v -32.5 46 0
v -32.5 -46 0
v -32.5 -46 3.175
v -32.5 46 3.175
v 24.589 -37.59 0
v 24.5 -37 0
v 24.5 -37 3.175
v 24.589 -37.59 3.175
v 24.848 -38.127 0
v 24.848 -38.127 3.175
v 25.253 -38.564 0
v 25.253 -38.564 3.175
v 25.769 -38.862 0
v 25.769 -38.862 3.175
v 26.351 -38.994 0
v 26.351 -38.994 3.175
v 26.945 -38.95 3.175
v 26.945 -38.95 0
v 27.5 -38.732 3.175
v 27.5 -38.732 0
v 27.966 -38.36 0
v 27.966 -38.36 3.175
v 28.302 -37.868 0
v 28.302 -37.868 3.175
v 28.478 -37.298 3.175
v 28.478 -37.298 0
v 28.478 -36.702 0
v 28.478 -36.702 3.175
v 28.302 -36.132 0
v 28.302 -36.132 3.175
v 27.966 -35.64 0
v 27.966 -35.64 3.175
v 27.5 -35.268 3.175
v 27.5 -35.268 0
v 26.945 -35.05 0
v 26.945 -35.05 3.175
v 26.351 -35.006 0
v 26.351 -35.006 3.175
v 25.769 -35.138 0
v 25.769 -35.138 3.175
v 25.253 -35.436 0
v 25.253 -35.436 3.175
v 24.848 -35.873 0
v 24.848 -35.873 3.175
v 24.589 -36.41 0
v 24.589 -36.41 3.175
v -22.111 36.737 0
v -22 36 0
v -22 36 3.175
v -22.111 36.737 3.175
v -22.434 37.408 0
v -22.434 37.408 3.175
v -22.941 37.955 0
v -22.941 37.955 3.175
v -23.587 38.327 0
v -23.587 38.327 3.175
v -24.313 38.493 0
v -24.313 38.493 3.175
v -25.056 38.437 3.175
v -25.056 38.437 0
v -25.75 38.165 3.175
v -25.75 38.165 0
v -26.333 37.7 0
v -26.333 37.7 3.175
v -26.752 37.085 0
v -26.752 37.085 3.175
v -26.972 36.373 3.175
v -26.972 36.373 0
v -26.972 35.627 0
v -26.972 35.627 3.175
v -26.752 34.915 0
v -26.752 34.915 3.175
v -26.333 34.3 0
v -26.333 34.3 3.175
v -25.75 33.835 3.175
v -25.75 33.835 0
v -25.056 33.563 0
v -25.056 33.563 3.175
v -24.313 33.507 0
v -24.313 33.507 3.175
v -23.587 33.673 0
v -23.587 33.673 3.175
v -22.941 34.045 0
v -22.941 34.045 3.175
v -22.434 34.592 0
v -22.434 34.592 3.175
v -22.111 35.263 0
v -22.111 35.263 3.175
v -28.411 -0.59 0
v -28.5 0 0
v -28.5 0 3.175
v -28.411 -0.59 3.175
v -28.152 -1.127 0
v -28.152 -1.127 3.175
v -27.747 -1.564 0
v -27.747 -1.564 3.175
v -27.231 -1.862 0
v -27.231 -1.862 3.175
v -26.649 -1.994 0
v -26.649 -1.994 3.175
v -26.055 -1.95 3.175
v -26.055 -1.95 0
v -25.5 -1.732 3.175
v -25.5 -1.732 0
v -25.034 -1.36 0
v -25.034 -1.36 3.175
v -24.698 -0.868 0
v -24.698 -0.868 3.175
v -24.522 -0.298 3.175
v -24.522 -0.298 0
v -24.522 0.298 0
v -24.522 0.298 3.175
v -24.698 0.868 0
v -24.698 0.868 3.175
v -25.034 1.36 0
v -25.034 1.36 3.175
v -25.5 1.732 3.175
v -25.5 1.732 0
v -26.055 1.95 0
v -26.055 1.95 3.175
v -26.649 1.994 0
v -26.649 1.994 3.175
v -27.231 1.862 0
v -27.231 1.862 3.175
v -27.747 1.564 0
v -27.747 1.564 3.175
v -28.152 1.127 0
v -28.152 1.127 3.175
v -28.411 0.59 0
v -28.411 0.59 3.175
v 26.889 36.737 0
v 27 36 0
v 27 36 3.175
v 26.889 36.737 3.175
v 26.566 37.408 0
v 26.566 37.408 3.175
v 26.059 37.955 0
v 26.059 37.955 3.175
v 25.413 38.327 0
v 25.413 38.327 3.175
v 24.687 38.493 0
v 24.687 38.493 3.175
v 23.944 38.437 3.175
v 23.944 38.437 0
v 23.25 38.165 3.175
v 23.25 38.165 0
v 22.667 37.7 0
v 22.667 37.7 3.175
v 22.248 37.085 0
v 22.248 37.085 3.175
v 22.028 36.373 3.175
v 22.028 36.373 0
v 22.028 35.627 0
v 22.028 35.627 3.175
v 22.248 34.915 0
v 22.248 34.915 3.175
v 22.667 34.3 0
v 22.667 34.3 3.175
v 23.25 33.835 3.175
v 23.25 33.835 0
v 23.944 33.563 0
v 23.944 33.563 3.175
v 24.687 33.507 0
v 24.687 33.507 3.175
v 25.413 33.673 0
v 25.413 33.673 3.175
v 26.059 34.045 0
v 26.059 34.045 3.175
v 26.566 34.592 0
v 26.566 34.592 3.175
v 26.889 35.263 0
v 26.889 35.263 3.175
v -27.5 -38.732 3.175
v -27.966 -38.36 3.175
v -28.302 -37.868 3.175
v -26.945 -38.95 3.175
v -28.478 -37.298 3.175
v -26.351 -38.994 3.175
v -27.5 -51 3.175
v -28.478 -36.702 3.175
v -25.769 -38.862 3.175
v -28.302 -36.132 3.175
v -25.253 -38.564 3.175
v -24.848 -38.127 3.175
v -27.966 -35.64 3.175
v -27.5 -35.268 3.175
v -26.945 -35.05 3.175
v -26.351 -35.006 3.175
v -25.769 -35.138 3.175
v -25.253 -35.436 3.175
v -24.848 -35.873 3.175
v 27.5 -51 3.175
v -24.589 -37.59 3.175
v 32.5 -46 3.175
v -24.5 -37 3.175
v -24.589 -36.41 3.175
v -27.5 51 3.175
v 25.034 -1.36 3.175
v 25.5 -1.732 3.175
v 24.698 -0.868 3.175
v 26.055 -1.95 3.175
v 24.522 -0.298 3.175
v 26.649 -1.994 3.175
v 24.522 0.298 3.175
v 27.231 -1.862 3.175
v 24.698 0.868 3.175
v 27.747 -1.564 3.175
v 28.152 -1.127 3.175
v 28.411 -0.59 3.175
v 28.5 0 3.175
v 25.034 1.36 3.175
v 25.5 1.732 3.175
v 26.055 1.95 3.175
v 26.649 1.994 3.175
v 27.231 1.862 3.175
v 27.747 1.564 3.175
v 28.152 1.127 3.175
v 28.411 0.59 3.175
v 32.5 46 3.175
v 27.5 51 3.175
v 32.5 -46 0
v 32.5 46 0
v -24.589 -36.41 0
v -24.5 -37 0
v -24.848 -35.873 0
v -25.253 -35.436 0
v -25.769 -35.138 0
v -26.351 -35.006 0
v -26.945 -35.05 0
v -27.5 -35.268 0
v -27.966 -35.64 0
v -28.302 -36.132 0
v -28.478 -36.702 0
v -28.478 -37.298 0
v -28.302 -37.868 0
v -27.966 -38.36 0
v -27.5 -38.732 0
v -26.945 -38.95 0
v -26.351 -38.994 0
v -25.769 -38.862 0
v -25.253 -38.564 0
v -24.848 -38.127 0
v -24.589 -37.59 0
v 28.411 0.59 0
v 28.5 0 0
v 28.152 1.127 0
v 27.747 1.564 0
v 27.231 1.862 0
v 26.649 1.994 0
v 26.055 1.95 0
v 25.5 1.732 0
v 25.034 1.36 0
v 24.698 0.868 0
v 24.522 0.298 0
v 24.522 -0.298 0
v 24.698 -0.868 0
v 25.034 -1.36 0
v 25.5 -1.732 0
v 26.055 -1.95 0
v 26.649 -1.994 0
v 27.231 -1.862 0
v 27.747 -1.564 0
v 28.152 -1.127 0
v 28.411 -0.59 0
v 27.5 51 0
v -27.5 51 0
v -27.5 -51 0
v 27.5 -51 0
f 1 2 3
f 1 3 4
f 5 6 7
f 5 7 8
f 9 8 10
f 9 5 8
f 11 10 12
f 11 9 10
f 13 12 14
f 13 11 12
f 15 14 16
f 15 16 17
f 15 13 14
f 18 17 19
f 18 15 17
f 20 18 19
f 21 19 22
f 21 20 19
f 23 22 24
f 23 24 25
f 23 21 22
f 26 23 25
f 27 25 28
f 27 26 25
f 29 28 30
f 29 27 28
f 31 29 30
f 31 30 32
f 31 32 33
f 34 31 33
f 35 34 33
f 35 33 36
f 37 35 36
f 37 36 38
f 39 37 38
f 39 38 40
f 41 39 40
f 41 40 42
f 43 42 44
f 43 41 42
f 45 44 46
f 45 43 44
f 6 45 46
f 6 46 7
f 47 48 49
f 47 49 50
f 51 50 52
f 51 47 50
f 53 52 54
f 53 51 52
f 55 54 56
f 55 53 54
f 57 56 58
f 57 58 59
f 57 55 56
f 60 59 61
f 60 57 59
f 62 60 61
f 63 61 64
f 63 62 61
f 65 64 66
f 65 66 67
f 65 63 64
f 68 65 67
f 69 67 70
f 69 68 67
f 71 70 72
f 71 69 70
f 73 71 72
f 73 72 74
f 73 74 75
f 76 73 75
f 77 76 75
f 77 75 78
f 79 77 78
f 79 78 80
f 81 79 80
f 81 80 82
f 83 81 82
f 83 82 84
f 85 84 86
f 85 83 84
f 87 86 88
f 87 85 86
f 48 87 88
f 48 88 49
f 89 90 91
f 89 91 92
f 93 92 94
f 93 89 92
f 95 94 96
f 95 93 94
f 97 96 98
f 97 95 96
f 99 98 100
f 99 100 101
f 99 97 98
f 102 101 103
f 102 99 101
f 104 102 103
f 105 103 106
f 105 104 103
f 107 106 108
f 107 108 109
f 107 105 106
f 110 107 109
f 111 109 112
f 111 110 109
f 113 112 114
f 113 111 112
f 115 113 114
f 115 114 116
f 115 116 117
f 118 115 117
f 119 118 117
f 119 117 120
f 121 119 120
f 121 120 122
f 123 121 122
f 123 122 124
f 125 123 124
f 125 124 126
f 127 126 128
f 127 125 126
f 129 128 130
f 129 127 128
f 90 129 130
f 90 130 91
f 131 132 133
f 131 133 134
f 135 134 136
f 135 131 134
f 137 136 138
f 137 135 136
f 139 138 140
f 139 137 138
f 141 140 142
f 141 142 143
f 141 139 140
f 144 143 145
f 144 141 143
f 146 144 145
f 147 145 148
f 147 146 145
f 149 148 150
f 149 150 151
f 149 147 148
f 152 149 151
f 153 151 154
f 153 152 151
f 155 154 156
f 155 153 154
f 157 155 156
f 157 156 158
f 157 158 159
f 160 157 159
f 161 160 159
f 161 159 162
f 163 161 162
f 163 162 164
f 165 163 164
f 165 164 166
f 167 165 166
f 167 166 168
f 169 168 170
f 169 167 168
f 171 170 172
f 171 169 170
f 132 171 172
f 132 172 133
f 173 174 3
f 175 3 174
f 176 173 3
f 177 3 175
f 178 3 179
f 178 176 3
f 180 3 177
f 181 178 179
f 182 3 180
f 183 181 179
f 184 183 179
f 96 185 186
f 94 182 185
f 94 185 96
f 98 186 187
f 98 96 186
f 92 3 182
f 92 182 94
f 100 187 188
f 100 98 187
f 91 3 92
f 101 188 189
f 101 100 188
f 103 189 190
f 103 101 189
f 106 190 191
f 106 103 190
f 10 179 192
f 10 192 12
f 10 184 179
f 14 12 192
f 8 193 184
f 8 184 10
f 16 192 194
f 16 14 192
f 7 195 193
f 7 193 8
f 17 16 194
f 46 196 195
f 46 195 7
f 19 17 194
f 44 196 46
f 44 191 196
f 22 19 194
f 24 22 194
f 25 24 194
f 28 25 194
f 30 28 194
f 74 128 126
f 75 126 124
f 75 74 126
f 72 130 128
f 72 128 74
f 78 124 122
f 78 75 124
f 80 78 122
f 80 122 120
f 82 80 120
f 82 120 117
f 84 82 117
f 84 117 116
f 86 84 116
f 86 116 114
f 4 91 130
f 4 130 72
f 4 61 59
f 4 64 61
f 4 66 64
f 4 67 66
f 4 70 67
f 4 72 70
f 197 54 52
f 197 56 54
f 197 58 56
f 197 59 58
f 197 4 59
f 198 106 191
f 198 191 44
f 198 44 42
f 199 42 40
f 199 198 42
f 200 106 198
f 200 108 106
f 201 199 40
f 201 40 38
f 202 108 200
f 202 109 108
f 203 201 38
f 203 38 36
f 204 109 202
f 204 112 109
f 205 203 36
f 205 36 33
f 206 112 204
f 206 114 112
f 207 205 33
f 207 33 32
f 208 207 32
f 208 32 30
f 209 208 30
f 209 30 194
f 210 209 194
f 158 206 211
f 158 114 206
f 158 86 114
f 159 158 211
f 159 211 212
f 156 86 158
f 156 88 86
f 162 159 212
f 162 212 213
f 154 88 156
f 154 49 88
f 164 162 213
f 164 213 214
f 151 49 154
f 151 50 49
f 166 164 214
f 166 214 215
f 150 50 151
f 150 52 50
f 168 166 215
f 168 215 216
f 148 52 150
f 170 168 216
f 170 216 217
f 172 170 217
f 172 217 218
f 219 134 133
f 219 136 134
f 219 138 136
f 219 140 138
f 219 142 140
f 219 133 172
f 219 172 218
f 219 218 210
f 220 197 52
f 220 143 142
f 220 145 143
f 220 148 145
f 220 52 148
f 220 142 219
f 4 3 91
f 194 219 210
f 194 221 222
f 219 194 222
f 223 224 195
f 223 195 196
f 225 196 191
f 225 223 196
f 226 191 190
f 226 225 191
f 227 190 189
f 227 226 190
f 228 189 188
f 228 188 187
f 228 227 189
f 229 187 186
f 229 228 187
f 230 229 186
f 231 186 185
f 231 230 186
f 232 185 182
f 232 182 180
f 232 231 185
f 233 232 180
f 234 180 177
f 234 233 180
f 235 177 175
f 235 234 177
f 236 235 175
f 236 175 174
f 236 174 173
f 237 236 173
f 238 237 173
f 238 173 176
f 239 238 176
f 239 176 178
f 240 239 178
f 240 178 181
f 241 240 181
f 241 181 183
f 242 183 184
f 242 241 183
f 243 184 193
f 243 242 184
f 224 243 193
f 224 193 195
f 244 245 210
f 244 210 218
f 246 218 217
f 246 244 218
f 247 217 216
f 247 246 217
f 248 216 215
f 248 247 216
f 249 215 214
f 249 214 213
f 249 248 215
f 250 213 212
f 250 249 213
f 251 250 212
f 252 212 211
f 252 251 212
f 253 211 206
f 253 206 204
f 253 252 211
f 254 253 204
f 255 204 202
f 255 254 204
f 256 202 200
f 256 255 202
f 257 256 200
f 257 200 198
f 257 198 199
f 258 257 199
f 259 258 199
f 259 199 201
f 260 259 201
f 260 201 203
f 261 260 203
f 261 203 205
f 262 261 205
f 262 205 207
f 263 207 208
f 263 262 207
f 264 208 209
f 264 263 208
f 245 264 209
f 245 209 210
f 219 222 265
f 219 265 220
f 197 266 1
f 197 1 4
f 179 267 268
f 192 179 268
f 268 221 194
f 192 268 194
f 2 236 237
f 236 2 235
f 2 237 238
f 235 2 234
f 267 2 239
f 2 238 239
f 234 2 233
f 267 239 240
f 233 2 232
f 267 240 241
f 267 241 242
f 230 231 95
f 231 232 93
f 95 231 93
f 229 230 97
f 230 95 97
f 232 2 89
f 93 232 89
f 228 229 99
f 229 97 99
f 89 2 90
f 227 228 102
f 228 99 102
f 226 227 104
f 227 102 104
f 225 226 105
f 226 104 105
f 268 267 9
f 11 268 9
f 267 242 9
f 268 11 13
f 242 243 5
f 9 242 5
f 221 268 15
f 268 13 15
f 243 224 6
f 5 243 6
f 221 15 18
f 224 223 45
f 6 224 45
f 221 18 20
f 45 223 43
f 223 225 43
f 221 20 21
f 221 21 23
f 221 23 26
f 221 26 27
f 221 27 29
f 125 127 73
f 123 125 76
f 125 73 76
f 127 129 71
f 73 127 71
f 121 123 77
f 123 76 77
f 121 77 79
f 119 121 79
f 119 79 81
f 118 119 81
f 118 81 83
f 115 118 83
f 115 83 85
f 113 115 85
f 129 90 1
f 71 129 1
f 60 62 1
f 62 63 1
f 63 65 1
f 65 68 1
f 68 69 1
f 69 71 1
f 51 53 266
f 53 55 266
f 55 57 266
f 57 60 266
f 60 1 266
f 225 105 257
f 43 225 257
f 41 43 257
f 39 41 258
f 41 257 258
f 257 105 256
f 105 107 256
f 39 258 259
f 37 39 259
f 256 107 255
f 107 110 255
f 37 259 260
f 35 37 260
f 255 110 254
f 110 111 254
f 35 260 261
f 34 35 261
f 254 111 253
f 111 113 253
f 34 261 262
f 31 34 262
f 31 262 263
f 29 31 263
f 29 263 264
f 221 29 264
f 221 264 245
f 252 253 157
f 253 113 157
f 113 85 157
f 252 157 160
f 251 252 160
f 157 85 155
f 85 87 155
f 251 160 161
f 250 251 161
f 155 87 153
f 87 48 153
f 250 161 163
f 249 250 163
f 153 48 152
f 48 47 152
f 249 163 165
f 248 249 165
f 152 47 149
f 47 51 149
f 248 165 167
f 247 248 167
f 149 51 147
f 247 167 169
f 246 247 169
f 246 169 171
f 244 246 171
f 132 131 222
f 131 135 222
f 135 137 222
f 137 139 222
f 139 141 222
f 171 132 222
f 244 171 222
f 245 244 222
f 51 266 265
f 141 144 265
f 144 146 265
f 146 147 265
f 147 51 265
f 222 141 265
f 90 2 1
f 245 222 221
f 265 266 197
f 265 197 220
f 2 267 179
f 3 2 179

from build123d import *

# Parameters (mm, degrees)
SKETCH1_W           = 65
SKETCH1_H           = 102
SKETCH1_R           = 2.5
SKETCH1_R_2         = 2
BOSS_EXTRUDE1_DEPTH = 3.175
CHAMFER1_SIZE       = 5


with BuildPart() as part:
    # Sketch1 → Boss-Extrude1 (new body)
    with BuildSketch(Plane.XY):
        Rectangle(SKETCH1_W, SKETCH1_H)
        with Locations((24.5, 36)):
            Circle(SKETCH1_R, mode=Mode.SUBTRACT)
        with Locations((-24.5, 36)):
            Circle(SKETCH1_R, mode=Mode.SUBTRACT)
        with Locations((26.5, 0)):
            Circle(SKETCH1_R_2, mode=Mode.SUBTRACT)
        with Locations(Location((-26.5, 0, 0), (0, 0, 180))):
            Circle(SKETCH1_R_2, mode=Mode.SUBTRACT)
        with Locations((-26.5, -37)):
            Circle(SKETCH1_R_2, mode=Mode.SUBTRACT)
        with Locations(Location((26.5, -37, 0), (0, 0, 180))):
            Circle(SKETCH1_R_2, mode=Mode.SUBTRACT)
    extrude(amount=BOSS_EXTRUDE1_DEPTH)

    # Chamfer1
    chamfer1_edges = [part.edges().sort_by_distance(p)[0] for p in [
        (32.5, -51, 1.5875),
        (-32.5, -51, 1.5875),
        (-32.5, 51, 1.5875),
        (32.5, 51, 1.5875),
    ]]
    chamfer(chamfer1_edges, length=CHAMFER1_SIZE)


solid = part.part
